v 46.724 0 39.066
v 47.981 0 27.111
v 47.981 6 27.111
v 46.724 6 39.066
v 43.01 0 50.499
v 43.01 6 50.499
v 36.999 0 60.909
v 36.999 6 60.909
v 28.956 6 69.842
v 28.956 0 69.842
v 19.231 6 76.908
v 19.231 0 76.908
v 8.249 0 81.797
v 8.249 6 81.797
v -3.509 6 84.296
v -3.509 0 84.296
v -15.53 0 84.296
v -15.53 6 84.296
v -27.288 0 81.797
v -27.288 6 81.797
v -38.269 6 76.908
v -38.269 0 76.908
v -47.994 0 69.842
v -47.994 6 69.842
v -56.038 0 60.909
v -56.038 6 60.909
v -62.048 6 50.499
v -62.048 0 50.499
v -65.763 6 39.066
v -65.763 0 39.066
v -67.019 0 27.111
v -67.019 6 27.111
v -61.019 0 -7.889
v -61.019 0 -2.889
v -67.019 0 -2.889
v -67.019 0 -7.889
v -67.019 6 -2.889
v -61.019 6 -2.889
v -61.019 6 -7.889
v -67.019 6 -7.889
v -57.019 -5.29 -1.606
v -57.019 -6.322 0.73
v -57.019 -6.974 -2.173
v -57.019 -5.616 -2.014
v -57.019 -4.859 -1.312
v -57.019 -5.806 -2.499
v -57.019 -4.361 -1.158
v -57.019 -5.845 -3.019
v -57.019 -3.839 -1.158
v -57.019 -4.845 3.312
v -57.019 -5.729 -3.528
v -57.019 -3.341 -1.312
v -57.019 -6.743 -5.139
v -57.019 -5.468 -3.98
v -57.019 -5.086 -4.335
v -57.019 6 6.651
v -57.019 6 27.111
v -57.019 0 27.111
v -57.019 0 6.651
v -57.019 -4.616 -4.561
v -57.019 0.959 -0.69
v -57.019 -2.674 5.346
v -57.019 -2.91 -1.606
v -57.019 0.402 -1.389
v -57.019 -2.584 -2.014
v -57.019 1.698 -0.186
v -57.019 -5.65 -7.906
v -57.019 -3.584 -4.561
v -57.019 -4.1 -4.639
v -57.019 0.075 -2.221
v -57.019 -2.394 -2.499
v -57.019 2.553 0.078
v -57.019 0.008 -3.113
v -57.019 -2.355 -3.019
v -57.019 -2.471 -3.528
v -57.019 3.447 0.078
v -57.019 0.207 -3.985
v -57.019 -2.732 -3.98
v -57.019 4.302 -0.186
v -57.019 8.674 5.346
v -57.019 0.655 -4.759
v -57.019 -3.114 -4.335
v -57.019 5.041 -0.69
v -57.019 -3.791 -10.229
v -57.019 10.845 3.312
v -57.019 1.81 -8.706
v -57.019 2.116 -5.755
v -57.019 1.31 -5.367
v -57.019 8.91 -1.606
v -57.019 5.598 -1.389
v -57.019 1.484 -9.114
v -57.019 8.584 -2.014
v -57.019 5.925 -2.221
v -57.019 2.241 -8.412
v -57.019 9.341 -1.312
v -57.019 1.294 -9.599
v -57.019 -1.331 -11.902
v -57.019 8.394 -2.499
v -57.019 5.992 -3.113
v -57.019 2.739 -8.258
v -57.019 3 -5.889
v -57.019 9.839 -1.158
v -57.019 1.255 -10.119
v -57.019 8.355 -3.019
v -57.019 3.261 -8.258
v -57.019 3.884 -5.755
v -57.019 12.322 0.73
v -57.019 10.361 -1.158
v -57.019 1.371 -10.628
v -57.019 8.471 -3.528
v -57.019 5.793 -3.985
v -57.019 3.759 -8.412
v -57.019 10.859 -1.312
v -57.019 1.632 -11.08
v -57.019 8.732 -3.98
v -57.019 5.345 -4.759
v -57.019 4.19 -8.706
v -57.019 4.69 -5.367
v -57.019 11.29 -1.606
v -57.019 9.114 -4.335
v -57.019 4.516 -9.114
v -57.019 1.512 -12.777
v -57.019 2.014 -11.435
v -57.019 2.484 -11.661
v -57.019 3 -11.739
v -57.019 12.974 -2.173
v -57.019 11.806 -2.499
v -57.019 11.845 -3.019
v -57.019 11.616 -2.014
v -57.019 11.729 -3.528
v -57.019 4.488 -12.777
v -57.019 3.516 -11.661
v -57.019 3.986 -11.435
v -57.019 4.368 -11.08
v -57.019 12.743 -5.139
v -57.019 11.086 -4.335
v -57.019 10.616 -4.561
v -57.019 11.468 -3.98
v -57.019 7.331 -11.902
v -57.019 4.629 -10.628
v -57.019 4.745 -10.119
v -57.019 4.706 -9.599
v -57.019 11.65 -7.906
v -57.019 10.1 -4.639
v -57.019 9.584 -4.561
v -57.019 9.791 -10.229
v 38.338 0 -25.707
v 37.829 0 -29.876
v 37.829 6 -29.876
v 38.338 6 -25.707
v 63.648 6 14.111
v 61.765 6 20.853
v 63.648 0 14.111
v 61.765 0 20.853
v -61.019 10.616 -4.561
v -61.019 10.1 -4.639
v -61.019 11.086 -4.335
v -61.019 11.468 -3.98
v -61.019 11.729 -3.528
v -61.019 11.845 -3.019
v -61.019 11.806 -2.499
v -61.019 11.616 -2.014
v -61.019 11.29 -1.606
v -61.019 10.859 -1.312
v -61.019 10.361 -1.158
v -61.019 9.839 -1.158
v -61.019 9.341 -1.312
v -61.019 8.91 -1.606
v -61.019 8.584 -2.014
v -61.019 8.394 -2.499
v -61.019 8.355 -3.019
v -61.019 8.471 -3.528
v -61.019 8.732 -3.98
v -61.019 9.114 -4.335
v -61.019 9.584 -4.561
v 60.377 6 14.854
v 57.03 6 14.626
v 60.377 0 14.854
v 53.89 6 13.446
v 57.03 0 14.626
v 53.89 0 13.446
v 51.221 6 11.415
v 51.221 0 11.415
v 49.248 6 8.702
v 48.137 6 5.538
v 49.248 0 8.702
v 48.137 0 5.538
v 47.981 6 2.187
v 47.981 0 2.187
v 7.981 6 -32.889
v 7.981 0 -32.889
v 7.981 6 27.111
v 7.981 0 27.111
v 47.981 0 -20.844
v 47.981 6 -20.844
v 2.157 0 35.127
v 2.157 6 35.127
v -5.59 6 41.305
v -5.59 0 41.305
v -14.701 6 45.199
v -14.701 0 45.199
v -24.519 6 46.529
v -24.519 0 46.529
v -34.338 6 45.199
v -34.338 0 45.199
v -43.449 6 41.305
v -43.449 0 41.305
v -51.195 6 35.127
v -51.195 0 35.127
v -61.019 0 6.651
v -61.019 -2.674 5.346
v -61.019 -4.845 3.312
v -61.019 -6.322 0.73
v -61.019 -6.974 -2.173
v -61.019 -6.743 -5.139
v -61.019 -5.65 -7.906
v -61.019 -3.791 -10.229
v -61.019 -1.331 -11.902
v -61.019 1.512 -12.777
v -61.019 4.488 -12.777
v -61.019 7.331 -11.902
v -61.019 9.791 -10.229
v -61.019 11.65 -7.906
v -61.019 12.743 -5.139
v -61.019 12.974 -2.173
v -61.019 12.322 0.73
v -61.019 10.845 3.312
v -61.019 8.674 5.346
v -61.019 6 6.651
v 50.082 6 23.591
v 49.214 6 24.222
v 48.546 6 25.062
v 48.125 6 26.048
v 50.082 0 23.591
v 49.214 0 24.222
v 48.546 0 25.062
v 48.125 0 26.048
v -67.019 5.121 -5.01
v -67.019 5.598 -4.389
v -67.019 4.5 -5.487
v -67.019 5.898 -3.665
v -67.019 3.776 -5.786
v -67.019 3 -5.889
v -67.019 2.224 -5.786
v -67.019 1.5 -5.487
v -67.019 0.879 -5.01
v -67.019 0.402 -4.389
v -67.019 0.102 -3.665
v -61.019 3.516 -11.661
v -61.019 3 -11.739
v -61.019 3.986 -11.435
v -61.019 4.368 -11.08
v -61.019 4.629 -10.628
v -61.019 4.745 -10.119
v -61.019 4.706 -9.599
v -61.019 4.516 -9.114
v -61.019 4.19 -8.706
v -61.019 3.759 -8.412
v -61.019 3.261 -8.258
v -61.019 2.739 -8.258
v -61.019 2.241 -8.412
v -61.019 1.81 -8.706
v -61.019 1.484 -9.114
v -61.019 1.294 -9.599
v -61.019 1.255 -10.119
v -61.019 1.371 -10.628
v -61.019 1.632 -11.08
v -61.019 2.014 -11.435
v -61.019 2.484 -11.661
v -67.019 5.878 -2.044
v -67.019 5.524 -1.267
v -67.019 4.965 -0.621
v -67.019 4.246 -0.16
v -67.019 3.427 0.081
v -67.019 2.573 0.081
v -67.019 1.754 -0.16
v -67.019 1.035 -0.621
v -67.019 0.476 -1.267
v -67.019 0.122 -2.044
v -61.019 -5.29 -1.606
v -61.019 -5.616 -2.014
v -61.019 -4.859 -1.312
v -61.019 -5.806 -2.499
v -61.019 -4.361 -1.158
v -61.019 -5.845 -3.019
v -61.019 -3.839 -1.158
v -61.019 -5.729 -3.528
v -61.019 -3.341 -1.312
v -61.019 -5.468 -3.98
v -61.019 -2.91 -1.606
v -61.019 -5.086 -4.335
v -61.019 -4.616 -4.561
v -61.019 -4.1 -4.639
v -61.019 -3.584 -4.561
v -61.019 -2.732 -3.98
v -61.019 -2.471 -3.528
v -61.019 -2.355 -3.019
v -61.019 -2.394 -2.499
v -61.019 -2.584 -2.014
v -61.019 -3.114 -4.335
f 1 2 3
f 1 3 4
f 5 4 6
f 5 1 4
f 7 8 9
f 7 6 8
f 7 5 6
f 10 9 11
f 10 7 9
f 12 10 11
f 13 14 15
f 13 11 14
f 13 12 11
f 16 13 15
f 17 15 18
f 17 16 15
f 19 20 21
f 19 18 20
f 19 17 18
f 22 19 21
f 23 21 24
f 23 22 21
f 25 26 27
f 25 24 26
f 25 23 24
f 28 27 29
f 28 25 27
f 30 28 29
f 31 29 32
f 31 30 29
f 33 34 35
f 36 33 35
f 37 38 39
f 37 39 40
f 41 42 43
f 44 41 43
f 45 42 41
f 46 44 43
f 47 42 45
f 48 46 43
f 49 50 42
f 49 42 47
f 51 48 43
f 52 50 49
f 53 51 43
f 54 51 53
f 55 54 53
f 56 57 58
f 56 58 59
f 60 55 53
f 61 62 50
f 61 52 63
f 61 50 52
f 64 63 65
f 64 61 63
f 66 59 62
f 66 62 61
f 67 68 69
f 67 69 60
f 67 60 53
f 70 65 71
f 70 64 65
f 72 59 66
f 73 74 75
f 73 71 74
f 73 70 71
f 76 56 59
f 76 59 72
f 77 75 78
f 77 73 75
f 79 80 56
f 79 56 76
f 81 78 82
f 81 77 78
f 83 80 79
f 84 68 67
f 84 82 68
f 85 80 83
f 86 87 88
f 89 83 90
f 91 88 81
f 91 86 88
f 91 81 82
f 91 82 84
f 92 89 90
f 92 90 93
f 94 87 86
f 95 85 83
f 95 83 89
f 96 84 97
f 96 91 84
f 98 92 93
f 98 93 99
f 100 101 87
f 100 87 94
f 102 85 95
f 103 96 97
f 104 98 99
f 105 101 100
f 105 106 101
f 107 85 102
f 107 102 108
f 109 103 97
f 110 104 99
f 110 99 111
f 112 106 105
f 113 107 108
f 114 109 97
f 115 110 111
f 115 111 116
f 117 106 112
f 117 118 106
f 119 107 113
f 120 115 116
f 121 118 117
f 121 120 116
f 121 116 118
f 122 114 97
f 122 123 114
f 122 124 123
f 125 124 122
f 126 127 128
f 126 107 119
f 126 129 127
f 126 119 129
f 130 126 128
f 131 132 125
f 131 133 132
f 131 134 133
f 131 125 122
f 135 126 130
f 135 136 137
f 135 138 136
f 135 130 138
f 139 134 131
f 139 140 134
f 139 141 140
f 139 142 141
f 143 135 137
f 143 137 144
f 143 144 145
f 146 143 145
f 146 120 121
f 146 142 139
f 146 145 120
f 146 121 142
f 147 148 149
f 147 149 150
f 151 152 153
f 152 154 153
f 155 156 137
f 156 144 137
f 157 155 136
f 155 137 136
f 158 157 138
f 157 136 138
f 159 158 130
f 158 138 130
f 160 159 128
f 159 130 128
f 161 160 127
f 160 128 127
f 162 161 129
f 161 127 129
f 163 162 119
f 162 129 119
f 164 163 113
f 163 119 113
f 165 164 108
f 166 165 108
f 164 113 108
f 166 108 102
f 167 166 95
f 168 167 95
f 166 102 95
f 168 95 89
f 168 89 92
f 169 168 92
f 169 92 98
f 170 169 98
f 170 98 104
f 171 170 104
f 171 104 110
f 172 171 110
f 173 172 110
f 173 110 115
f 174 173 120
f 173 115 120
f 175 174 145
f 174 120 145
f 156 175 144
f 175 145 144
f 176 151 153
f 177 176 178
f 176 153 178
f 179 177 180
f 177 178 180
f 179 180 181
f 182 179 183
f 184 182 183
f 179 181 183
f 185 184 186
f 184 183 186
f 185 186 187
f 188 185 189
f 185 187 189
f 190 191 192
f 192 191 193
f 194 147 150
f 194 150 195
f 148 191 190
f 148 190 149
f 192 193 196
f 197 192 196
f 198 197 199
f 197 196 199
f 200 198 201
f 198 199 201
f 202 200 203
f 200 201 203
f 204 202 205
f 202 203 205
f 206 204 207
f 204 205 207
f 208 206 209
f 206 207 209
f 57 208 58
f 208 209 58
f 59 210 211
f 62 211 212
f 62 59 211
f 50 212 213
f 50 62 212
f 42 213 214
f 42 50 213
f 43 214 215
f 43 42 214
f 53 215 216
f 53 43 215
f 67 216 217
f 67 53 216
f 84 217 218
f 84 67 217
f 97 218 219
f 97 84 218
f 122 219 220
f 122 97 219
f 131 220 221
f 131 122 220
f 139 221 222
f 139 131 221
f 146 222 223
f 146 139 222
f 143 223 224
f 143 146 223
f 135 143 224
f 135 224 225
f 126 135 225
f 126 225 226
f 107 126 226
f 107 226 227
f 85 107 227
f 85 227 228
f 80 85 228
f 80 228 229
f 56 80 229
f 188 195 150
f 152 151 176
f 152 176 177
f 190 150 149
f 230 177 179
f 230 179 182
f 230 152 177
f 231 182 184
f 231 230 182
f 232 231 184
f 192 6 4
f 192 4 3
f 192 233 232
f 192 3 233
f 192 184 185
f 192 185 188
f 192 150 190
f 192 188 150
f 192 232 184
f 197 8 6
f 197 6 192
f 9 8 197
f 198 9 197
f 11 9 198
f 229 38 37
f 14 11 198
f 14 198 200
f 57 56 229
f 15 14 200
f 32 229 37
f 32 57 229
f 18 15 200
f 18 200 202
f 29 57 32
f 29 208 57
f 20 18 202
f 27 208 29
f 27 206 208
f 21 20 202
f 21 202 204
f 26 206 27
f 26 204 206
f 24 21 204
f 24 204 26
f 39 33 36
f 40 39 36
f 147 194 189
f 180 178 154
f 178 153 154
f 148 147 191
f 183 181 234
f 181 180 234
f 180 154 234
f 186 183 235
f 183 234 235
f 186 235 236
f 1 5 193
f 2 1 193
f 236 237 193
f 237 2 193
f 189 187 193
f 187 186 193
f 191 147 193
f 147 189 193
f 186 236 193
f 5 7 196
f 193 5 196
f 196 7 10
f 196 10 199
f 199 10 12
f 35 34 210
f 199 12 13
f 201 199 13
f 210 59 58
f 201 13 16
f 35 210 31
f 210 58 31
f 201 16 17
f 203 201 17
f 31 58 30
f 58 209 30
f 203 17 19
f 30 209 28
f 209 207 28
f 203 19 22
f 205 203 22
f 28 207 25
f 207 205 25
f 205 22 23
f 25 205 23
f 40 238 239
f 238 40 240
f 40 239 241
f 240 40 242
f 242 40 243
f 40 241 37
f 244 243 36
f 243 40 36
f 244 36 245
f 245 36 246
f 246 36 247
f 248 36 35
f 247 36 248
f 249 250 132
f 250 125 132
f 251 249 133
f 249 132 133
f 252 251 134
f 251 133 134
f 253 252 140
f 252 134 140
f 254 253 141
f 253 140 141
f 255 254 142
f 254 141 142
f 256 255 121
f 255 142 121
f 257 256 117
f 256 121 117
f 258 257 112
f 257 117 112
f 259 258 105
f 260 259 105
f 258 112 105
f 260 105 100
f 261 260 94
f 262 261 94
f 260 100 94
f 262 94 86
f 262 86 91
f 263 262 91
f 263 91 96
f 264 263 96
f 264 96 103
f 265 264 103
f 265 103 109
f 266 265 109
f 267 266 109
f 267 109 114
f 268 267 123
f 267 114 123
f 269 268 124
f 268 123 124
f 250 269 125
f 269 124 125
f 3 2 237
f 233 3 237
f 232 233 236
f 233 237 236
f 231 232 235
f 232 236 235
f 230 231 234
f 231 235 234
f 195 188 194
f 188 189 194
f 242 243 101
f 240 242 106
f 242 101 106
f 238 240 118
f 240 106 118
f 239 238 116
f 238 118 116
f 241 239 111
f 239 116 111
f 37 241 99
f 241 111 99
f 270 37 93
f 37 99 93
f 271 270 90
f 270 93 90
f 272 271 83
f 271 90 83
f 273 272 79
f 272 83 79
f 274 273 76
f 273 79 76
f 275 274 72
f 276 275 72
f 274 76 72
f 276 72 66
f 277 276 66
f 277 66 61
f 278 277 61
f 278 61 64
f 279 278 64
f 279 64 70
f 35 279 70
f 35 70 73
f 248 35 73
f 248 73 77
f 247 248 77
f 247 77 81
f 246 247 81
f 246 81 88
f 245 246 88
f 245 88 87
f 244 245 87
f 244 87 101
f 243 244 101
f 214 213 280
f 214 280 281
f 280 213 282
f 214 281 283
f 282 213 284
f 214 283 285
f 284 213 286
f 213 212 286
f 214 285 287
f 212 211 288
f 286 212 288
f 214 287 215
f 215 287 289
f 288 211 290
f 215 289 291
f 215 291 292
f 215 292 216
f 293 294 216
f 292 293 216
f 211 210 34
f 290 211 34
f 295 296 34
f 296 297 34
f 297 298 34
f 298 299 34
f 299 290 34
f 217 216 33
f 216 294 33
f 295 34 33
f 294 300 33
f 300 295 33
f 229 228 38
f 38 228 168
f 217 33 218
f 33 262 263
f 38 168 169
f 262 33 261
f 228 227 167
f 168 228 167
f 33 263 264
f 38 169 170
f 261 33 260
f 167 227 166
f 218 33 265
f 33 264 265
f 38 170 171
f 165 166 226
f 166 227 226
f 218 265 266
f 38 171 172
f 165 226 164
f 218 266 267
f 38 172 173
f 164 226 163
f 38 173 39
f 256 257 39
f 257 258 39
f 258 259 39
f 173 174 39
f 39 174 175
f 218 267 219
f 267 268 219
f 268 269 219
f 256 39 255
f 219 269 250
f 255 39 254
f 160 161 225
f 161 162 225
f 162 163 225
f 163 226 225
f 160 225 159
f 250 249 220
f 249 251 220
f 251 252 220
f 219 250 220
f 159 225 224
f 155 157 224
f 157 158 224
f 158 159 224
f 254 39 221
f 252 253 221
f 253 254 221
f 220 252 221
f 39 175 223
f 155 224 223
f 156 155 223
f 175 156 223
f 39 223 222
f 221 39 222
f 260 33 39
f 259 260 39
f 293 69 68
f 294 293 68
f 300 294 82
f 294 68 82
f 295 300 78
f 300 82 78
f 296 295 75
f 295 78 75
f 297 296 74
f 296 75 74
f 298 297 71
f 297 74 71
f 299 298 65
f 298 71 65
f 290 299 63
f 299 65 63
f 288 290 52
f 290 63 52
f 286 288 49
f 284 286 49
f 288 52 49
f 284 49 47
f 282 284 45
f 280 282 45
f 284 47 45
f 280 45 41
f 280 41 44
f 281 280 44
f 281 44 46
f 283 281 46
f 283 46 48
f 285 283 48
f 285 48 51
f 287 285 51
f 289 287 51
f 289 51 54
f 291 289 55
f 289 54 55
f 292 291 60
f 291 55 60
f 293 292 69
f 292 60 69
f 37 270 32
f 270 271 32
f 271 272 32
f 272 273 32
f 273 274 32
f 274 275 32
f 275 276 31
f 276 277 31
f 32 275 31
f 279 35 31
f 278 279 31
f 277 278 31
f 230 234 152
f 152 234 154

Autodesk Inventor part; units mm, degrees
ref_plane "YZ Plane" through (0, 0, 0) normal (1, 0, 0) x (0, 1, 0)
ref_plane "XZ Plane" through (0, 0, 0) normal (0, 1, 0) x (-1, 0, 0)
ref_plane "XY Plane" through (0, 0, 0) normal (0, 0, 1) x (1, 0, 0)
sketch "prindere" plane through (0, 0, 0) normal (0, 0, 1) x (1, 0, 0)
  circle A0 centre (0, 0) radius 10 construction
  circle A1 centre (0, -7.1) radius 1.75 construction
  circle A2 centre (0, 7.1) radius 1.75 construction
  circle A3 centre (-7.1, 0) radius 1.75 construction
  circle A4 centre (7.1, 0) radius 1.75 construction
  circle A5 centre (0, 0) radius 1.65 construction
  dimension "d1" = 10
sketch "Sketch1" plane through (0, 0, 0) normal (0, 1, 0) x (-1, 0, 0)
  line L0 (67.0192, 27.1113) -> (57.0192, 27.1113) construction
  line L1 (57.0192, 27.1113) -> (57.0192, -7.8887)
  line L2 (57.0192, -7.8887) -> (67.0192, -7.8887)
  line L3 (67.0192, -7.8887) -> (67.0192, 27.1113)
  line L4 (-7.9808, 27.1113) -> (-47.9808, 27.1113) construction
  line L5 (-47.9808, 27.1113) -> (-47.9808, -20.8435)
  line L6 (-47.9808, -32.8887) -> (-7.9808, -32.8887) construction
  line L7 (-7.9808, -32.8887) -> (-7.9808, 27.1113)
  arc A0 (57.0192, 27.1113) -> (-7.9808, 27.1113) centre (24.5192, 9.6227) ccw
  arc A1 (67.0192, 27.1113) -> (-47.9808, 27.1113) centre (9.5192, 27.1113) ccw
  arc A2 (-50.0815, 23.591) -> (-47.9808, 27.1113) centre (-51.9808, 27.1113) ccw
  line L8 (-50.0815, 23.591) -> (-61.765, 20.853)
  line L9 (-61.765, 20.853) -> (-63.6478, 14.111)
  arc A3 (-47.9808, 2.187) -> (-63.6478, 14.111) centre (-59.4808, 3.3315) ccw
  line L10 (-7.9808, -32.8887) -> (-37.8292, -29.876)
  line L11 (-37.8292, -29.876) -> (-38.3378, -25.7069)
  line L12 (-38.3378, -25.7069) -> (-47.9808, -20.8435)
  line L13 (-47.9808, -20.8435) -> (-47.9808, -32.8887) construction
  point P0 (0, 0)
  dimension "d0" = 35
  dimension "d1" = 10
  dimension "d2" = 60
  dimension "d3" = 40
  dimension "d4" = 65
  dimension "d5" = 36.9066
  dimension "d6" = 12
  dimension "d7" = 4
  dimension "d8" = 7
  dimension "d9" = 11.5
  dimension "d10" = 30
  dimension "d11" = 10.8
  dimension "d12" = 4.2
  dimension "d13" = 11.5568
  dimension "d14" = 84.237
  dimension "d15" = 6.957
  dimension "d16" = 76.811
  dimension "d17" = 15.603
  dimension "d18" = 67.0192
  dimension "d19" = 7.8887
  dimension "d20" = 34.3956
extrude "Extrusion1" add sketch "Sketch1" along normal blind 6 contours A0 L7 L10 L11 L12 L5 A3 A1 L3 L2 L1 | L5 A3 L9 L8 A2
sketch "Sketch2" plane through (-57.0192, 0, 27.1113) normal (1, 0, 0) x (0, 0, -1)
  line L0 (0, 0) -> (35, 0) construction
  line L1 (35, 0) -> (35, 6) construction
  line L2 (0, 6) -> (35, 6) construction
  line L3 (0, 0) -> (0, 6) construction
  line L4 (0, 0) -> (0, 6) construction
  line L5 (0, 3) -> (35, 3) construction
  circle A0 centre (30, 3) radius 10
  circle A1 centre (30, 10.1) radius 1.75
  circle A2 centre (37.1, 3) radius 1.75
  circle A3 centre (30, -4.1) radius 1.75
  circle A4 centre (30, 3) radius 1.65
  point P0 (27.1113, 0)
  dimension "d23" = 5
extrude "Extrusion2" add sketch "Sketch2" against normal blind 4
sketch "Sketch3" plane through (-57.0192, 0, 27.1113) normal (1, 0, 0) x (0, 0, -1)
  arc A0 (20.4606, 0) -> (20.4606, 6) centre (30, 3) ccw projected
  circle A1 centre (30, 3) radius 3
  point P0 (27.1113, 0)
  dimension "d26" = 6
extrude "Extrusion3" cut sketch "Sketch3" against normal through all
equation "\"d1\" = hmic"
equation "\"d0\" = lmic"
equation "\"d2\" = lmare"
equation "\"d3\" = hmare"
equation "\"d4\" = rcerc"
equation "\"d6\" = laripa"
equation "\"d7\" = rcerculet1"
equation "\"d8\" = haripa"
equation "\"d9\" = rcerculet2"
equation "\"d10\" = 0.5 * lmare"
equation "\"d11\" = 0.18 * lmare"
equation "\"d12\" = 0.07 * lmare"
equation "\"d21\" = grosime"
equation "\"lmic\" = 35"
equation "\"hmic\" = 10"
equation "\"rcerc\" = 65"
equation "\"lmare\" = 60"
equation "\"hmare\" = 40"
equation "\"rcerculet1\" = 4"
equation "\"rcerculet2\" = 11.5"
equation "\"laripa\" = 12"
equation "\"haripa\" = 7"
equation "\"grosime\" = 6"
properties part number "carma"
